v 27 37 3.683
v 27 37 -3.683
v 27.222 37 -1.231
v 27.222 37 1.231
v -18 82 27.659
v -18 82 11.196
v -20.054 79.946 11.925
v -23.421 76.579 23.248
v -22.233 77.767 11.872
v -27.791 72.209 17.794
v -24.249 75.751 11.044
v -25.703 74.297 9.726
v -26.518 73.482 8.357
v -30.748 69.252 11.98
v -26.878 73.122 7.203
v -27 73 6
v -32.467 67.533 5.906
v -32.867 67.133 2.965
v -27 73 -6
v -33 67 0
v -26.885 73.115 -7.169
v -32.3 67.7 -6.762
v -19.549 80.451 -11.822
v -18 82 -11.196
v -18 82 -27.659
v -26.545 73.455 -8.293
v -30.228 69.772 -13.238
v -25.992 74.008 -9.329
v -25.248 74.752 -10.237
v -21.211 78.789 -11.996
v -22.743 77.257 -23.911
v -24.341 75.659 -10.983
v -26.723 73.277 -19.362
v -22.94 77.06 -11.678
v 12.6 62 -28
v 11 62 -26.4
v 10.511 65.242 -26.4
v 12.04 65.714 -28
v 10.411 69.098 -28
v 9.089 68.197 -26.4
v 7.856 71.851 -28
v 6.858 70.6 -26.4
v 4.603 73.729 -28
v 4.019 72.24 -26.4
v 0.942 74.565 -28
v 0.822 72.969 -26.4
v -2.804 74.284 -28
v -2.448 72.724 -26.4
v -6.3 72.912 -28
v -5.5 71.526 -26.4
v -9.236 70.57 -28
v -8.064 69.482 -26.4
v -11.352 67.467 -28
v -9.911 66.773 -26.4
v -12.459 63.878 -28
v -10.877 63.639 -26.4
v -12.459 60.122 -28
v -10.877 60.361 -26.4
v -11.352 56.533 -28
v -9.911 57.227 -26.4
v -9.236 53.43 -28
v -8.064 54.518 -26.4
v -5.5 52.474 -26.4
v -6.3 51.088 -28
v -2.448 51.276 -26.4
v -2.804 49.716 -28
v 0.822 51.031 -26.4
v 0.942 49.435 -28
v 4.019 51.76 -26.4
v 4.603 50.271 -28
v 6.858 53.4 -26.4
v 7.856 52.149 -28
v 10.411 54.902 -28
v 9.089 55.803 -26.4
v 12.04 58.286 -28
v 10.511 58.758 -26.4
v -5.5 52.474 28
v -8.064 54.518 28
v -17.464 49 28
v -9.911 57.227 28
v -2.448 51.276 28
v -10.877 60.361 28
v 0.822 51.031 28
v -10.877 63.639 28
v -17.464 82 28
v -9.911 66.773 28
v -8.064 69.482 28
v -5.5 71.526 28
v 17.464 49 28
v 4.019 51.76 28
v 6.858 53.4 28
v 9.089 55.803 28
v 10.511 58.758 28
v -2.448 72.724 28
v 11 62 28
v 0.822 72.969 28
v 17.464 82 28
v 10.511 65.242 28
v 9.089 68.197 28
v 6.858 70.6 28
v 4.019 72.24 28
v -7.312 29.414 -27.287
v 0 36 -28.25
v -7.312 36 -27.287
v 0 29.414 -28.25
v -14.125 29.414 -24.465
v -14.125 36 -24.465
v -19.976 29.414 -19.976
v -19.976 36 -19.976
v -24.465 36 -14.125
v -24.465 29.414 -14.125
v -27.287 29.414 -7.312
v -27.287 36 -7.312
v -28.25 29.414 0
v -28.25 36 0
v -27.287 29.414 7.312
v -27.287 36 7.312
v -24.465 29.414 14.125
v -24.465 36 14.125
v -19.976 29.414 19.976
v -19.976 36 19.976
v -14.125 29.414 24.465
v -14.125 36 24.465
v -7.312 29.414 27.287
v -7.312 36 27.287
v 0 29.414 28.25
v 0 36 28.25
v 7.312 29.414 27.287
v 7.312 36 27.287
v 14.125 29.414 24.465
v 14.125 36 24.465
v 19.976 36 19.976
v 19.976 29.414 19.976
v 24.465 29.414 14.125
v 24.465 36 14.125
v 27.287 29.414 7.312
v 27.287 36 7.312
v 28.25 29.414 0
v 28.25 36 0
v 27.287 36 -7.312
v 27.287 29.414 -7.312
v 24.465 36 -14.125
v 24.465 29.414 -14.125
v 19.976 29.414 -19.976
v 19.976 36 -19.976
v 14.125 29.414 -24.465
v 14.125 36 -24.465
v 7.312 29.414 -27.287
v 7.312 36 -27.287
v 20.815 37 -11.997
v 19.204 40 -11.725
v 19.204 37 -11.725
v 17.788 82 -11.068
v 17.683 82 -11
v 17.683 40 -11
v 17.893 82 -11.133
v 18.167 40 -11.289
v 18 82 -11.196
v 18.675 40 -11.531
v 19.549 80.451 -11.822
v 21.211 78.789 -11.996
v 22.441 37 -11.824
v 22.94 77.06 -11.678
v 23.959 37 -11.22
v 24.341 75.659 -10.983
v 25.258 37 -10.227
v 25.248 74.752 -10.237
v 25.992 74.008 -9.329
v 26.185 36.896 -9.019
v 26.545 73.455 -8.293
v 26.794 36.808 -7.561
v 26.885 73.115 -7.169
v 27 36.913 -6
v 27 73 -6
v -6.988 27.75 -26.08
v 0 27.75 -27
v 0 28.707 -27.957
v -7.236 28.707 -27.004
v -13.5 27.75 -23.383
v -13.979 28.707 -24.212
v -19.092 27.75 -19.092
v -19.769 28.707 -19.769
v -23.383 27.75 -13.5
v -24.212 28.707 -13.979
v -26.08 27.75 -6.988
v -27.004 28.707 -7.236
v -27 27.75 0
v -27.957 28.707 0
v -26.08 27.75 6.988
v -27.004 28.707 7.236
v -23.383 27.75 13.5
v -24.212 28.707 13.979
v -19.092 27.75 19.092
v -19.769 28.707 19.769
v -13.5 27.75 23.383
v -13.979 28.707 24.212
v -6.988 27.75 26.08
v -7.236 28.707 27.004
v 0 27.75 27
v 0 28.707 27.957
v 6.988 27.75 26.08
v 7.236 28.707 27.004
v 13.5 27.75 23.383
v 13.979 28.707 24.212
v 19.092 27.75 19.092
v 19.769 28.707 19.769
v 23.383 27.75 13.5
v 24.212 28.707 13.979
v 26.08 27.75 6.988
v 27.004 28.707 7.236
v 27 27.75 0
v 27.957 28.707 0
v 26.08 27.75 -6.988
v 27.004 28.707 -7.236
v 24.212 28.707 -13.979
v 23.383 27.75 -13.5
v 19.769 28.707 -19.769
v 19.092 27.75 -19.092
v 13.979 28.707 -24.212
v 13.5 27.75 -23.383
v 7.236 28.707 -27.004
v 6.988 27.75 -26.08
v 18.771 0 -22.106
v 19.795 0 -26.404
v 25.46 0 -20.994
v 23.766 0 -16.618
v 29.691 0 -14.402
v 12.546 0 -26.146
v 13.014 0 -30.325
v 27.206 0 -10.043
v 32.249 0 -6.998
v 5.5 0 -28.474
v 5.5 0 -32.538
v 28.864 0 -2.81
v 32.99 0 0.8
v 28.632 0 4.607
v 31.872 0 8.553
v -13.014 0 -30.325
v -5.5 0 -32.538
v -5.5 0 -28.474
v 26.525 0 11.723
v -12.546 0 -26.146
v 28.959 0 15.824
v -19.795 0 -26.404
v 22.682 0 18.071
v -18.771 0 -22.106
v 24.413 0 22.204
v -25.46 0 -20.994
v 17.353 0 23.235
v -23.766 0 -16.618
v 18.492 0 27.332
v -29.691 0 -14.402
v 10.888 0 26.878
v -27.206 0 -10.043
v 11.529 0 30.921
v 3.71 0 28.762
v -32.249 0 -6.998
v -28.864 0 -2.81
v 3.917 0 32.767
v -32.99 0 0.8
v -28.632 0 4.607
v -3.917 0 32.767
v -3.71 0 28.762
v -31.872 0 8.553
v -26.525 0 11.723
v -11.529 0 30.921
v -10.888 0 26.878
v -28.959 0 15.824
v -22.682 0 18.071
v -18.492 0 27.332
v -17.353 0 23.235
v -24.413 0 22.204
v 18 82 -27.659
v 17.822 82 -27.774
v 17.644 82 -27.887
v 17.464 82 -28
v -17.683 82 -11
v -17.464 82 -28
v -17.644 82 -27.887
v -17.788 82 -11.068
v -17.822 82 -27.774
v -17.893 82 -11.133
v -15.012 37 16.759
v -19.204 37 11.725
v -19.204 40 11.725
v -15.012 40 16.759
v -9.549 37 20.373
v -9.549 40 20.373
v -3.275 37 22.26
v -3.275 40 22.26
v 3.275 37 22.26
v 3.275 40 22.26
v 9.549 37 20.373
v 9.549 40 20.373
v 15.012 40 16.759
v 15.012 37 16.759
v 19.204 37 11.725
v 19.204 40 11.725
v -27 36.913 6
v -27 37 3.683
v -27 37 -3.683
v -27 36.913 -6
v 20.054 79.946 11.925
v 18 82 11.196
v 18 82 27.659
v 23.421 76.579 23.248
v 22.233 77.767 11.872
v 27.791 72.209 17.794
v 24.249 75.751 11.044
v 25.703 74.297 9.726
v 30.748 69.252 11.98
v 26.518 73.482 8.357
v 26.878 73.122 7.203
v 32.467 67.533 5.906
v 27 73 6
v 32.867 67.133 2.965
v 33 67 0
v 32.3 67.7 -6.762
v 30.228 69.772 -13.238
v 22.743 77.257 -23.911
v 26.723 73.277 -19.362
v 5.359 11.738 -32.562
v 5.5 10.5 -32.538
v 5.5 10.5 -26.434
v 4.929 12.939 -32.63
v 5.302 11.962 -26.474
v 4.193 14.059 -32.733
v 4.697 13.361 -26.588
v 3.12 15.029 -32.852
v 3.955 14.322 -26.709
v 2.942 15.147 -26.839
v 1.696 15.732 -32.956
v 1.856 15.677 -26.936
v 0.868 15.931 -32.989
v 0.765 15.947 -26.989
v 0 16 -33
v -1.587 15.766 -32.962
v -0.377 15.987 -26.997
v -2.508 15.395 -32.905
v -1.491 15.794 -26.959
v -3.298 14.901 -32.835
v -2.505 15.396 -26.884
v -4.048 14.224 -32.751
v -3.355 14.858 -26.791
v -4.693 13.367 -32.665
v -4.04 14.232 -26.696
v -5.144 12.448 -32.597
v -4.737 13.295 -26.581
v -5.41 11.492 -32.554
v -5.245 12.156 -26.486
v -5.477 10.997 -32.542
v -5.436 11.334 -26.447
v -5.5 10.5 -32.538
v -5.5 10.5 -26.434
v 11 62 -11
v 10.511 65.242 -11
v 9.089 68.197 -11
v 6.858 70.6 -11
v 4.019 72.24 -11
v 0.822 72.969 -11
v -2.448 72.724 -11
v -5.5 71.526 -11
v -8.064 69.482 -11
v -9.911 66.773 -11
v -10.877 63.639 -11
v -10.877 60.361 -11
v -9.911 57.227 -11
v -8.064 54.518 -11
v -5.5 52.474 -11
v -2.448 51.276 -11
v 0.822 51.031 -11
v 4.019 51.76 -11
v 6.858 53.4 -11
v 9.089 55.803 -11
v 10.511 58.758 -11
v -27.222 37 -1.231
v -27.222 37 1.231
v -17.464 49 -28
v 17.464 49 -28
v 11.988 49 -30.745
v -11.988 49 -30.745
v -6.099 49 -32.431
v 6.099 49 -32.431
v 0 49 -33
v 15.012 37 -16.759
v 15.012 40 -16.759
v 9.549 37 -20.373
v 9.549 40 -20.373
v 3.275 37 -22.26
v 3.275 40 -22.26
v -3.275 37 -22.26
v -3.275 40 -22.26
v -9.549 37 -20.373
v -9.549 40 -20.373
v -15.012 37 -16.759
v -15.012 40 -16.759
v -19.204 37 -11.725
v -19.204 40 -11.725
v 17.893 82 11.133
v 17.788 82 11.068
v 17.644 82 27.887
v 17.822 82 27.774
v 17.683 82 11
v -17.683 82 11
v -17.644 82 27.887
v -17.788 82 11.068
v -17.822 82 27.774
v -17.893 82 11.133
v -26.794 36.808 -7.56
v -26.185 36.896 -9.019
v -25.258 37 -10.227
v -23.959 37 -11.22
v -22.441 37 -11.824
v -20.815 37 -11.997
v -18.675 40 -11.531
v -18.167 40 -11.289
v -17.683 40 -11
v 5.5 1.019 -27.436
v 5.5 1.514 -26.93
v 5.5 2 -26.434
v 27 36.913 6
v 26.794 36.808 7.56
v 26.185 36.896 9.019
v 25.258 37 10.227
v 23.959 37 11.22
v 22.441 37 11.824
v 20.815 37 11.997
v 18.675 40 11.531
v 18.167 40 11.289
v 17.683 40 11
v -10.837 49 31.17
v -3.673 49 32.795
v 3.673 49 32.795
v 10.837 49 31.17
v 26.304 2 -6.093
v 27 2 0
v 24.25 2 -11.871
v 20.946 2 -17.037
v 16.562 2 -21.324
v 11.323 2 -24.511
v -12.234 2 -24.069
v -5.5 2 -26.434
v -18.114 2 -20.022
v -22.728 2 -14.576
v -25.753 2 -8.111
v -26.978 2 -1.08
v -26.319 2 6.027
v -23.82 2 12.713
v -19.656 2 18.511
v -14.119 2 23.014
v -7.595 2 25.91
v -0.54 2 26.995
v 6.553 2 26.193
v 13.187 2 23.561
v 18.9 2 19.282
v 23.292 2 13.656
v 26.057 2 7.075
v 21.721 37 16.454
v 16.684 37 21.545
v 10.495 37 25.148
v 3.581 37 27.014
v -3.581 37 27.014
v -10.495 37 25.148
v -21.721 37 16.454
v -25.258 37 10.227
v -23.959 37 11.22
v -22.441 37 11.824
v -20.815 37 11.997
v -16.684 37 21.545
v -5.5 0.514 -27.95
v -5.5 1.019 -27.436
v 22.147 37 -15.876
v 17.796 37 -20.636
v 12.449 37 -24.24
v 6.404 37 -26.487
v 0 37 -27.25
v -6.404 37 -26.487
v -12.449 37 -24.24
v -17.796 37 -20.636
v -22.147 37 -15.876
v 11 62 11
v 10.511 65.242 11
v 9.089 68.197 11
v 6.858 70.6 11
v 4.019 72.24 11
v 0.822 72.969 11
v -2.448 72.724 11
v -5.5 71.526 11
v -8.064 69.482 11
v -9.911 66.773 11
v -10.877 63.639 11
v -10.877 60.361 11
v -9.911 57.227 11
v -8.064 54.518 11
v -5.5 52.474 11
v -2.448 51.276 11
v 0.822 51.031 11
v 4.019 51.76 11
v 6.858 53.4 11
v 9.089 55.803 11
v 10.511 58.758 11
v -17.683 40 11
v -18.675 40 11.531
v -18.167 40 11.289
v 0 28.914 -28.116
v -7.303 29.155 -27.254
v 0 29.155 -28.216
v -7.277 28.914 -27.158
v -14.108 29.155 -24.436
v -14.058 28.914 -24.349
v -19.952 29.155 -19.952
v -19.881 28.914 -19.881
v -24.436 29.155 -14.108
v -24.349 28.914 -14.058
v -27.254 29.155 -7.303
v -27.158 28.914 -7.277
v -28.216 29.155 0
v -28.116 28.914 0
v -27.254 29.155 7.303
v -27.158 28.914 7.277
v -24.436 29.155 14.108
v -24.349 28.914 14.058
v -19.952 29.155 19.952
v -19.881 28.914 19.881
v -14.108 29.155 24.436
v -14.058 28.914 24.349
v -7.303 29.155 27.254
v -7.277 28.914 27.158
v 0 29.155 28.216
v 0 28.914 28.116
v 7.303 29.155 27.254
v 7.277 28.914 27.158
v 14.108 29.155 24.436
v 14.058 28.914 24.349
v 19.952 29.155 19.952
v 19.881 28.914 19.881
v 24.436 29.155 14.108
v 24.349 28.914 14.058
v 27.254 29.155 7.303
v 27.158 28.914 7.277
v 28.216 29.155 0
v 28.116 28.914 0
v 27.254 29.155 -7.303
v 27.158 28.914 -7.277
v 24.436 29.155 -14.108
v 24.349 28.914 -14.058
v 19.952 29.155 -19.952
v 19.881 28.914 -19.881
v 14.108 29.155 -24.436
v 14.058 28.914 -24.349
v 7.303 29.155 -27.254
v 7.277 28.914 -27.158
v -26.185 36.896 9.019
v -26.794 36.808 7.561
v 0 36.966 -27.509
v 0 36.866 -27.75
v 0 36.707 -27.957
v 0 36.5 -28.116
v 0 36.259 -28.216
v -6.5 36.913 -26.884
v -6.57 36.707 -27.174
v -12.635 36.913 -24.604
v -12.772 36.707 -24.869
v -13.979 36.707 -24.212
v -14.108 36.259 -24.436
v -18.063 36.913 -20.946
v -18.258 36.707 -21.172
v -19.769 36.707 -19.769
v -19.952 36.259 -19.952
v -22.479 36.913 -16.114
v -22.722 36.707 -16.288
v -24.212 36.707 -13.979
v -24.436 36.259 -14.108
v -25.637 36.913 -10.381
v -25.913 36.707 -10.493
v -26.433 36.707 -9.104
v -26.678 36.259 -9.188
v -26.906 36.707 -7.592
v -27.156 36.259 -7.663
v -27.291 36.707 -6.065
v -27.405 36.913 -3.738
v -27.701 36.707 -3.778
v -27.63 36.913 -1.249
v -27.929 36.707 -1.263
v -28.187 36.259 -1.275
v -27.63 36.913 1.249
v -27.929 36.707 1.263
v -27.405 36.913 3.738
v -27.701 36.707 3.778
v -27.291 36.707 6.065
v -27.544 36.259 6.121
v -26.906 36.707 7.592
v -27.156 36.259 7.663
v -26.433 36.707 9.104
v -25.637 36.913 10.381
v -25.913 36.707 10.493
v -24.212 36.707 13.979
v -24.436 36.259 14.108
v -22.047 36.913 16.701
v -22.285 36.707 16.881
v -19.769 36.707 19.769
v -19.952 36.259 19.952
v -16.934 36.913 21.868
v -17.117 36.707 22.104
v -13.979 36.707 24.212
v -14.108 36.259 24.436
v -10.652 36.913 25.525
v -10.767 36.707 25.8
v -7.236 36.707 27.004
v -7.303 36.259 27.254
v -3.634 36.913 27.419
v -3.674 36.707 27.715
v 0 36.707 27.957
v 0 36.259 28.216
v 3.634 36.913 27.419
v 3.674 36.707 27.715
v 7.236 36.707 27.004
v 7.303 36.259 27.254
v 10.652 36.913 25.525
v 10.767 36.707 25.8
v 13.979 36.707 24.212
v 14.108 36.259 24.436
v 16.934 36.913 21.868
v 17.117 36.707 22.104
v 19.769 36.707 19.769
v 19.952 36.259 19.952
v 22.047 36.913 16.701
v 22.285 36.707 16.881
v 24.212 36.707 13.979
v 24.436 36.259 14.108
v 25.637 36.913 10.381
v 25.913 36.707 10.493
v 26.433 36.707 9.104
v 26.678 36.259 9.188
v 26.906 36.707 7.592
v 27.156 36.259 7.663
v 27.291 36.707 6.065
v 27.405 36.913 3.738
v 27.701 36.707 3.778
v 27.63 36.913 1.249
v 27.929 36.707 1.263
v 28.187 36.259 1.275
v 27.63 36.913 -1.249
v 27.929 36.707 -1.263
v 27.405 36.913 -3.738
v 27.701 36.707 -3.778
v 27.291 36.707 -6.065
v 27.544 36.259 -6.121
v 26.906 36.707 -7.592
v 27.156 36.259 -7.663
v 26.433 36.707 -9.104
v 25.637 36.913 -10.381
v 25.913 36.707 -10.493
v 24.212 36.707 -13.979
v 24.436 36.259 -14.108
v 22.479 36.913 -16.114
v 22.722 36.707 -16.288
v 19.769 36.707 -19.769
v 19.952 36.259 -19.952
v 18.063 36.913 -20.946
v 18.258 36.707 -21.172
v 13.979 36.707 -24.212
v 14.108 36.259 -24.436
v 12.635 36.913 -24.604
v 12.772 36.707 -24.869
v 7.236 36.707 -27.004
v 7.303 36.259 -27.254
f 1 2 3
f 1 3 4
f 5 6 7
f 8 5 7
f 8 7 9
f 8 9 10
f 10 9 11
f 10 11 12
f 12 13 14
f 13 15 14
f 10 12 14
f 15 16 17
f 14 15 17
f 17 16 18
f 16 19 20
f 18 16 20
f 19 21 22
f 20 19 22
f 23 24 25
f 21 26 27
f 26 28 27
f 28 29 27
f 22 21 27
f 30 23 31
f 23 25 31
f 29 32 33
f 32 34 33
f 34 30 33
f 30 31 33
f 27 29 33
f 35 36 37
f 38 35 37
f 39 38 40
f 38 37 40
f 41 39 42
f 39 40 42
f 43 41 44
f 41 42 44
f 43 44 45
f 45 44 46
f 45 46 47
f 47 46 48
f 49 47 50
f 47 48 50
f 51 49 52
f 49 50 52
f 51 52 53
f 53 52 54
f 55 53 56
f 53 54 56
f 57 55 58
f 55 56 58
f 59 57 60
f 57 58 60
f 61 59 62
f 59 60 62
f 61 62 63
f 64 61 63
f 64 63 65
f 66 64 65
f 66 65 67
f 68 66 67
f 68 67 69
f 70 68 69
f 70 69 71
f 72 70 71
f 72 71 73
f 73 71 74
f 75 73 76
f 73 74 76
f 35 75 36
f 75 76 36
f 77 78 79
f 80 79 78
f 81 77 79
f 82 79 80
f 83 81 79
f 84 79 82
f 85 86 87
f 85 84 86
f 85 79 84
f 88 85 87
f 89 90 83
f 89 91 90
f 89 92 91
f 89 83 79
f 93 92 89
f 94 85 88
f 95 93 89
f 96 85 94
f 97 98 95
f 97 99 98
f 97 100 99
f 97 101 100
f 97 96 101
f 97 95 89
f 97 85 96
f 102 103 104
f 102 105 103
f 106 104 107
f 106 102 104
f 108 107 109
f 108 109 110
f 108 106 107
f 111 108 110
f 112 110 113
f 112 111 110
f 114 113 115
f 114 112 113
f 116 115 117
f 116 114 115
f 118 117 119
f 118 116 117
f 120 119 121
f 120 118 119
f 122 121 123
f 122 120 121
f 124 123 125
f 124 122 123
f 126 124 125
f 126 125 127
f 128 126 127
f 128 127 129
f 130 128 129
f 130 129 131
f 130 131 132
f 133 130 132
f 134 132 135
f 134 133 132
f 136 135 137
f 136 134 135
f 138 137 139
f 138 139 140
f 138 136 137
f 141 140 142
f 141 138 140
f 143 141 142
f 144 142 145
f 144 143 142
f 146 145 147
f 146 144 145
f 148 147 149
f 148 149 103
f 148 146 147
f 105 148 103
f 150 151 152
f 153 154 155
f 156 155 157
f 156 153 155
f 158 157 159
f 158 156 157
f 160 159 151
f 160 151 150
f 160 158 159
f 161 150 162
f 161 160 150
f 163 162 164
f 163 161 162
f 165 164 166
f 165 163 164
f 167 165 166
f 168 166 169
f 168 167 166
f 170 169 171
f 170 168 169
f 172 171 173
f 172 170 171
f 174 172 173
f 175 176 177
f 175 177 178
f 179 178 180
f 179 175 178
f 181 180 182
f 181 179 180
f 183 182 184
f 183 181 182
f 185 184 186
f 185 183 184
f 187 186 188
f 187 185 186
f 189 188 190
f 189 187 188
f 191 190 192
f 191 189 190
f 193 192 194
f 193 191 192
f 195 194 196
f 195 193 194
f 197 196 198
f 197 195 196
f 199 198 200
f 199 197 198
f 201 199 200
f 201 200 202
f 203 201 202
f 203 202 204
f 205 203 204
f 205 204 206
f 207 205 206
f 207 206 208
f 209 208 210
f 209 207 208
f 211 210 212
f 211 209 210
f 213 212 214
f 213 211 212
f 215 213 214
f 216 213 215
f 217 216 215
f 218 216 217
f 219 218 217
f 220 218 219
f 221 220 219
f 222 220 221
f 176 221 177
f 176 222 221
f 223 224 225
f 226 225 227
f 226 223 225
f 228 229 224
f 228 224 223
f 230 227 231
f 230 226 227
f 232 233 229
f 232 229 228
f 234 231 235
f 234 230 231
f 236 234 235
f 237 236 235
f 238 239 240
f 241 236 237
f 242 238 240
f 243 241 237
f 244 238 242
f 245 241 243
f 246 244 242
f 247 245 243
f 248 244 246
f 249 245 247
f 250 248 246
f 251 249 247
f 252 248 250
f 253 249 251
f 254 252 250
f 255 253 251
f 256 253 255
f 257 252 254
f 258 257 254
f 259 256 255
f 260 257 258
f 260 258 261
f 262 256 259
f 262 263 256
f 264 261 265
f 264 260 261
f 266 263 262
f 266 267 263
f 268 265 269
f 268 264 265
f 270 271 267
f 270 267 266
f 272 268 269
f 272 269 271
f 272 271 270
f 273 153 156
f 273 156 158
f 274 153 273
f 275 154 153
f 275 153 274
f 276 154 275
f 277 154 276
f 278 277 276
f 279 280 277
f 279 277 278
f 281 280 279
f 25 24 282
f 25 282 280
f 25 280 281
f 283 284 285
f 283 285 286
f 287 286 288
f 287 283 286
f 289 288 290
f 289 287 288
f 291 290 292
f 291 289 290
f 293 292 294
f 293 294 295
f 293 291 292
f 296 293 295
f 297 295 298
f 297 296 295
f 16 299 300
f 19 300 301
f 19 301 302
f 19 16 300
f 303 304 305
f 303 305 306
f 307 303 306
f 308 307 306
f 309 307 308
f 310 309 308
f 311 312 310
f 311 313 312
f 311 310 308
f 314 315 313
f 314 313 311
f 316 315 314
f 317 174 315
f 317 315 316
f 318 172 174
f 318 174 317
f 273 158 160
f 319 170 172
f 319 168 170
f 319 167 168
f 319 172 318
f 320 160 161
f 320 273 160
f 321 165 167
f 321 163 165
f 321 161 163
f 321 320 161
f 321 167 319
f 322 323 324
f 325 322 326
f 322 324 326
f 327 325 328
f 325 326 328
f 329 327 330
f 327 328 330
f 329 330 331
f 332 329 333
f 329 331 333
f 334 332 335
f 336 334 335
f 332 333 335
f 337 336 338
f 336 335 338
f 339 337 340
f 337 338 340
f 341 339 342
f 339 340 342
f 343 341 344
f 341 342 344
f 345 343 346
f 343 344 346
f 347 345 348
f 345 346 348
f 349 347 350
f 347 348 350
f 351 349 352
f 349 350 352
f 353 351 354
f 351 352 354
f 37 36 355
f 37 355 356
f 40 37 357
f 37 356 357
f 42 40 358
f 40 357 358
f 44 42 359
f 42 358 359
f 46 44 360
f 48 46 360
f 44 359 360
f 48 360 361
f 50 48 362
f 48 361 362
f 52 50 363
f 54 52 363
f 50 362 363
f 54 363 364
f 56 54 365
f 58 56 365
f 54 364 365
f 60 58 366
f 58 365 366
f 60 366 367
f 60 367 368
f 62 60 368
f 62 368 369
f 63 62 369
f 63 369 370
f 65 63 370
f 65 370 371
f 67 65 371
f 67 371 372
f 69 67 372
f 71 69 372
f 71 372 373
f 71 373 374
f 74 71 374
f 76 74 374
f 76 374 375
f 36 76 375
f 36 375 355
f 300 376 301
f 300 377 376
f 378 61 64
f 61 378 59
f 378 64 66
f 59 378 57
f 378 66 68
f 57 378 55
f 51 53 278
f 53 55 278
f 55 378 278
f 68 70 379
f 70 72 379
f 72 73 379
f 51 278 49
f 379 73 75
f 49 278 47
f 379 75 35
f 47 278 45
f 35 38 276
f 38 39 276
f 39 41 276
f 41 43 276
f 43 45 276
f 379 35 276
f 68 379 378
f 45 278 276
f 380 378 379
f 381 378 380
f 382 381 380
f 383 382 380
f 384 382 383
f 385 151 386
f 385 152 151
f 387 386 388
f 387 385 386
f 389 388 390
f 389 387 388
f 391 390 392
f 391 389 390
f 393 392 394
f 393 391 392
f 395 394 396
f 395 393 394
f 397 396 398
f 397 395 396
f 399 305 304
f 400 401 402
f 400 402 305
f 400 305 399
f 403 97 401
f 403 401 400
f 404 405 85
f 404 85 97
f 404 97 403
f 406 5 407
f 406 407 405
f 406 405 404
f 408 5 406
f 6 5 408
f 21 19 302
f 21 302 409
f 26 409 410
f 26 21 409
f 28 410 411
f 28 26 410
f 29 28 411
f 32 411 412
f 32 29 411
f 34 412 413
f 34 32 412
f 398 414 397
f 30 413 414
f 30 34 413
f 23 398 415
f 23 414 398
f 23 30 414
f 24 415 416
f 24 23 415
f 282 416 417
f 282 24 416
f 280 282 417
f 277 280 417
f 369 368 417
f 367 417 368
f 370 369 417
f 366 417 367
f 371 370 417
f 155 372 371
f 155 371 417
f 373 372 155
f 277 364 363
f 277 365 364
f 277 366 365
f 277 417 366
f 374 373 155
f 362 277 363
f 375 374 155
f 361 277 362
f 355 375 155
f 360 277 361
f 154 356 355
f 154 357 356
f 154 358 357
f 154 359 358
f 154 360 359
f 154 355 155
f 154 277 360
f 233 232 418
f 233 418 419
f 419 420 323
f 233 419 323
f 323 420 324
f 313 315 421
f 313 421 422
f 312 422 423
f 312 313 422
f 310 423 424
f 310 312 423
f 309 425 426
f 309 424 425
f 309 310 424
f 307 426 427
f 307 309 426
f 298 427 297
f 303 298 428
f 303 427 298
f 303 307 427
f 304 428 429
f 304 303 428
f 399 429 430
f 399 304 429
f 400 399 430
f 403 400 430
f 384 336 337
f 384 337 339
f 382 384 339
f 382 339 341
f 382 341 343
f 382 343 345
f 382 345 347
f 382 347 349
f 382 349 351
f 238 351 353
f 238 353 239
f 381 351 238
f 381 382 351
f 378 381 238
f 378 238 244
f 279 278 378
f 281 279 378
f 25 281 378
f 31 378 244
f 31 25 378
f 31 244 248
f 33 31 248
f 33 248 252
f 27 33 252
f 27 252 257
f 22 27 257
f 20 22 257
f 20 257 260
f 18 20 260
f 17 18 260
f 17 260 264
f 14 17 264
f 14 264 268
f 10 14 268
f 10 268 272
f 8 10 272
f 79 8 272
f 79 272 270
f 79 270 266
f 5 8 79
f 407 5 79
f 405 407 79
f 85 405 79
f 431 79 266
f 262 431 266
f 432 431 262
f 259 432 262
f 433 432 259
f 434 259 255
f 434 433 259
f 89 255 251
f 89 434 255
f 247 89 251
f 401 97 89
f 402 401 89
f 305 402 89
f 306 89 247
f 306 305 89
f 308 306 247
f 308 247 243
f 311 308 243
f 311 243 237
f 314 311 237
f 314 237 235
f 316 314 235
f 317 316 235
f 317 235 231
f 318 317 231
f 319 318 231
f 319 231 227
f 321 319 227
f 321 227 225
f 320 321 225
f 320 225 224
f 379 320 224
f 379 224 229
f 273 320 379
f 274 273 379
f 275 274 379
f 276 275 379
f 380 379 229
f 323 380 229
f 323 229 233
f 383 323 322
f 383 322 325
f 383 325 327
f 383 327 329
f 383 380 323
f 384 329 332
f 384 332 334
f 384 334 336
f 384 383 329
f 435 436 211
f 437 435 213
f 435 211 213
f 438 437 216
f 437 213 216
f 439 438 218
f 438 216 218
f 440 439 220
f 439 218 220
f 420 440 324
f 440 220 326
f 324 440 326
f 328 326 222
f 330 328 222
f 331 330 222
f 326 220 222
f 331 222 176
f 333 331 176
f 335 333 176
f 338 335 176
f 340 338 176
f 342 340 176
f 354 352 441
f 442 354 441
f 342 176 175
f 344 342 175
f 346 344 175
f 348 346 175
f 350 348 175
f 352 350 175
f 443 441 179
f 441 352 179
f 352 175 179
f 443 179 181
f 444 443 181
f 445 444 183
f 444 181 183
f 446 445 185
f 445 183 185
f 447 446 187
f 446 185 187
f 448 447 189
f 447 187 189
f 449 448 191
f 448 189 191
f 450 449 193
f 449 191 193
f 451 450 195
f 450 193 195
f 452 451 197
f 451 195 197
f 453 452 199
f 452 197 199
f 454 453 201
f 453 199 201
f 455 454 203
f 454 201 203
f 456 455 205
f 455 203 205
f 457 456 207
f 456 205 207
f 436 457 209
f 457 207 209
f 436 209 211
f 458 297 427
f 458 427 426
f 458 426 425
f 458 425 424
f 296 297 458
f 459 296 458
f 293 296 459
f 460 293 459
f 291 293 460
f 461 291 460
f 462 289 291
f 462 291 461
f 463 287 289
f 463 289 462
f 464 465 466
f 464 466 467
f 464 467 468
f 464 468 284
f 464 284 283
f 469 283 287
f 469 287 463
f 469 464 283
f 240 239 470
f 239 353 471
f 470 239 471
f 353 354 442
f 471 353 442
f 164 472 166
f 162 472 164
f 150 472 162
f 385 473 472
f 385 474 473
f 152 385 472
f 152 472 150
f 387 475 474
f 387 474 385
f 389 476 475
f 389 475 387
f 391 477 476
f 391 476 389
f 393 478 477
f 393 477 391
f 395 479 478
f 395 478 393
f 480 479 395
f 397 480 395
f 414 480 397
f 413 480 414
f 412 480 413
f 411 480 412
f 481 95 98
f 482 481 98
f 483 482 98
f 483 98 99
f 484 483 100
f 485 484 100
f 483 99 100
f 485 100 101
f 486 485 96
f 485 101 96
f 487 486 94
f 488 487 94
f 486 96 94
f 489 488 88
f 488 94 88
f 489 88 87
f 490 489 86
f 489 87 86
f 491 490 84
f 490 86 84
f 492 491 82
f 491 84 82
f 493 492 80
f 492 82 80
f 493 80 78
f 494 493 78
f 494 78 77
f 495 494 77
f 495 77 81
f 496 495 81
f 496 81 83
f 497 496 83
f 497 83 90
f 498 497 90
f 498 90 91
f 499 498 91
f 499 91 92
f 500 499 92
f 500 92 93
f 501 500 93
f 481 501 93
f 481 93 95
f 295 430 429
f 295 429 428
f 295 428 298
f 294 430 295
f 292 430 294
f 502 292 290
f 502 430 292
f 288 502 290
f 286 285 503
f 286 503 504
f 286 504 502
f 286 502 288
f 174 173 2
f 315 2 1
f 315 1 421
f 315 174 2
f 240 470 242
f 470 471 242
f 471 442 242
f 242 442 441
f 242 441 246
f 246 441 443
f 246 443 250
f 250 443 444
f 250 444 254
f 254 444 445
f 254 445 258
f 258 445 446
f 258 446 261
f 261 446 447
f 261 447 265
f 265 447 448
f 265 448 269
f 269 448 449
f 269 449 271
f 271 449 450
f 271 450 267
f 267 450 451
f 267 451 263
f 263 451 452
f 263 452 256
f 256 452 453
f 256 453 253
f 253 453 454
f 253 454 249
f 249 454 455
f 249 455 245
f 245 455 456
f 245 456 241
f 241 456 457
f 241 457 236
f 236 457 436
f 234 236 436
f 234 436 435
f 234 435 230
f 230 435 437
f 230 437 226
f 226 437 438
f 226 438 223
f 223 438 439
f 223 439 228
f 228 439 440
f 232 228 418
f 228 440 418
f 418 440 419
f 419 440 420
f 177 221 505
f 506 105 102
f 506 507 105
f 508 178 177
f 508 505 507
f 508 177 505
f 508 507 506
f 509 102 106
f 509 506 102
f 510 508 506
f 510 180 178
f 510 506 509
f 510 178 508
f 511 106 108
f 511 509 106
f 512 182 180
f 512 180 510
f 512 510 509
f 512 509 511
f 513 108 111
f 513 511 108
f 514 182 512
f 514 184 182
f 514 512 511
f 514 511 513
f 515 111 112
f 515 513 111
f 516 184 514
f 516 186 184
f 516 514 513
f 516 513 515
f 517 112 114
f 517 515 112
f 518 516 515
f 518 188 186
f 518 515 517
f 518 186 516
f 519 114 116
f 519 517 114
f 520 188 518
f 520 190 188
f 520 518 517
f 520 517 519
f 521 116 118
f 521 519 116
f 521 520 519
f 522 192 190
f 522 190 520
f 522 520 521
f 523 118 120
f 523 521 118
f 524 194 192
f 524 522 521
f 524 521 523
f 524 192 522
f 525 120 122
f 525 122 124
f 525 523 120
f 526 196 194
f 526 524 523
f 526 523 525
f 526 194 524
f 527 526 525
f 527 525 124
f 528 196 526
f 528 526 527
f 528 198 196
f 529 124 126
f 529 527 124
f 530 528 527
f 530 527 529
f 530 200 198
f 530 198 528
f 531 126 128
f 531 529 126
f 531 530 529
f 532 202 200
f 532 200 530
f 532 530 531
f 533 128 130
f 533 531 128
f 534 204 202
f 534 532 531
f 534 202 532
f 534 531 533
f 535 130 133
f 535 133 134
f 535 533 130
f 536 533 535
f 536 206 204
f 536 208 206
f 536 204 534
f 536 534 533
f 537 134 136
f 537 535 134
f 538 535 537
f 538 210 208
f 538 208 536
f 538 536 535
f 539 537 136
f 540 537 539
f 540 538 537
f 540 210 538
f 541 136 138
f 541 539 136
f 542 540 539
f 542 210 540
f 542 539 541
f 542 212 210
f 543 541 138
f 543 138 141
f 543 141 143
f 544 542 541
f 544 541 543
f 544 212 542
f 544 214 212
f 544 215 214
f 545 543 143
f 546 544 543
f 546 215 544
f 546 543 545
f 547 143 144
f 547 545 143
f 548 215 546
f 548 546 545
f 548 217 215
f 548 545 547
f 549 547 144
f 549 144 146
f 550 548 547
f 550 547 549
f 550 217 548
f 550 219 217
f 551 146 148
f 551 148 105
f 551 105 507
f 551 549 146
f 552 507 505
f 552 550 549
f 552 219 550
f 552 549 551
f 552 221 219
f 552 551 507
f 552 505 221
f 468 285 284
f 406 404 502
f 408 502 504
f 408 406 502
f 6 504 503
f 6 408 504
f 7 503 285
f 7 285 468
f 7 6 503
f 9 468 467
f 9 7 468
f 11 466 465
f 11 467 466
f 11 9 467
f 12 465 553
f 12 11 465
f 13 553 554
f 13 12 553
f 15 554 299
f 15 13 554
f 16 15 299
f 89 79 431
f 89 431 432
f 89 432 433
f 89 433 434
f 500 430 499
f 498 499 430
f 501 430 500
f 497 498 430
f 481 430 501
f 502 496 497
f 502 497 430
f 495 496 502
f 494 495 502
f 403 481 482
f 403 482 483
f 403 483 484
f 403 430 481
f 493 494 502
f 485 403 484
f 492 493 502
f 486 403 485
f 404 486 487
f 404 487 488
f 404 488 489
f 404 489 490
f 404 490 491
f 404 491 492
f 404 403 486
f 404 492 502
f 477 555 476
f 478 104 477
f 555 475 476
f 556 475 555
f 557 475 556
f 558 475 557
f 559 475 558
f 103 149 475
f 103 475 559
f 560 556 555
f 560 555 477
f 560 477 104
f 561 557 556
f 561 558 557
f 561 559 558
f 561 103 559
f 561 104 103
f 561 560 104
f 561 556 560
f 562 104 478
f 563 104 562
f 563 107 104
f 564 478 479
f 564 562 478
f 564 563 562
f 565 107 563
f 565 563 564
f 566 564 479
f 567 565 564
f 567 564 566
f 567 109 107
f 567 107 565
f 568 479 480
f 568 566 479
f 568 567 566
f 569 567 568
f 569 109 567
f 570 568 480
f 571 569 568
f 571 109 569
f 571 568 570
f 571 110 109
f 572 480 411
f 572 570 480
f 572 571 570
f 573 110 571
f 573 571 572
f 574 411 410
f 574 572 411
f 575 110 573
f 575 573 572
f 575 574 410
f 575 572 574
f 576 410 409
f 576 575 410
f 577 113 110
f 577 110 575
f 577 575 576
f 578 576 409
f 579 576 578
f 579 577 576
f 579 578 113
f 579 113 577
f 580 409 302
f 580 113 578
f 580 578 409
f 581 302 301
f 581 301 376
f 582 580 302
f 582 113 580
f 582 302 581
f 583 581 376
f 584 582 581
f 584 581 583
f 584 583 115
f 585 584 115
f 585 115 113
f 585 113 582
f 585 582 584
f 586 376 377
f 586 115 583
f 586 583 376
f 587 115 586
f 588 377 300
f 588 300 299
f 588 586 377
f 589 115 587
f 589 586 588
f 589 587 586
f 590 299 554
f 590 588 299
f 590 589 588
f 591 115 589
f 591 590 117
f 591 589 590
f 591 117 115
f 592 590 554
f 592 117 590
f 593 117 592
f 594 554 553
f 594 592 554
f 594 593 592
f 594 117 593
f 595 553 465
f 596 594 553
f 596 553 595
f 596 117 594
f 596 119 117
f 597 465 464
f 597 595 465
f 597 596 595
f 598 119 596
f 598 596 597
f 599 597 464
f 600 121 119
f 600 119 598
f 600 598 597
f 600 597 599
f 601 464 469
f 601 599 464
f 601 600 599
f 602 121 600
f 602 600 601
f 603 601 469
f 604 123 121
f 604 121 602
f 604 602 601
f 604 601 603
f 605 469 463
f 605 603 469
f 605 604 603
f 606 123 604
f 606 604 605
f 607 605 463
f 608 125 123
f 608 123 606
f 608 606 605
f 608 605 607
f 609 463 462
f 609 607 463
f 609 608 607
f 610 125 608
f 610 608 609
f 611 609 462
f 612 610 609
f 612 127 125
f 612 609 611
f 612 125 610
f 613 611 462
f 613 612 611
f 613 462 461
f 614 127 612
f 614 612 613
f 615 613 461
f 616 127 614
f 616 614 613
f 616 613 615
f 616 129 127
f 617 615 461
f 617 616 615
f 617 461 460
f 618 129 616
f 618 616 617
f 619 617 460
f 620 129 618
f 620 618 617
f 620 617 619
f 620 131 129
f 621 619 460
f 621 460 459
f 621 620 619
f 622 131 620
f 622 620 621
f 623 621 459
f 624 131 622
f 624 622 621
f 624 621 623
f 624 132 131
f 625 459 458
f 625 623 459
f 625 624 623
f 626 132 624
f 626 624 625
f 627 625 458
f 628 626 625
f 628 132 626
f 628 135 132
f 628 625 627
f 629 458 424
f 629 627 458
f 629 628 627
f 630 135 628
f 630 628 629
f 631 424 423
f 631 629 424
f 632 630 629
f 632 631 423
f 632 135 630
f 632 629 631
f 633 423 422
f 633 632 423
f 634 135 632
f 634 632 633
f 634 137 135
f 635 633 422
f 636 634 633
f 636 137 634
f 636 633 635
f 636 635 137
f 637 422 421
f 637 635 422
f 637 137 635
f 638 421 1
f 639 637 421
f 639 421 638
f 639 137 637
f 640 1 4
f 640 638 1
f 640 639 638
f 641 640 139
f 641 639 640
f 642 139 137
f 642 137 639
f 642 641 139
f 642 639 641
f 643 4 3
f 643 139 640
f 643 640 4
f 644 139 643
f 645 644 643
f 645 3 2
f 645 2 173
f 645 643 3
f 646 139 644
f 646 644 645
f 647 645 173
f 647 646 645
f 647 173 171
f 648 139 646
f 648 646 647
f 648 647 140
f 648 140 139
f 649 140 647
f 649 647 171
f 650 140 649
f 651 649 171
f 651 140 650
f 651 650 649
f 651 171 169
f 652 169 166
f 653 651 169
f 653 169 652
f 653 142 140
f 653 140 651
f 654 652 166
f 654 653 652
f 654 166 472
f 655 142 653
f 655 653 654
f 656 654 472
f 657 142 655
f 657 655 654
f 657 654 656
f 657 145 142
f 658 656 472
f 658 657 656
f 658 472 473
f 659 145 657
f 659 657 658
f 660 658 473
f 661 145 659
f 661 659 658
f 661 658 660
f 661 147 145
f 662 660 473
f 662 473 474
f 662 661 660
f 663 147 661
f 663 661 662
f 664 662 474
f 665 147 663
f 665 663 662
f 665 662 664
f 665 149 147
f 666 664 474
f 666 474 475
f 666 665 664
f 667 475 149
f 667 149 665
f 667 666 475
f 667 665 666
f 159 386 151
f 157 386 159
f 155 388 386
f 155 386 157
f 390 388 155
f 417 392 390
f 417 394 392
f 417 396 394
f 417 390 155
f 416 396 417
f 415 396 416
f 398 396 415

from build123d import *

# Parameters (mm, degrees)
HOLE_WIZARD_M561_D           = 54
HOLE_WIZARD_M561_DEPTH       = 30
HOLE_WIZARD_M561_CSINK_D     = 58
HOLE_WIZARD_M561_CSINK_ANGLE = 90
CUT_EXTRUDE_START            = 28
SKETCH_4_W                   = 66
SKETCH_4_H                   = 33
CUT_EXTRUDE_1_DEPTH          = 67.350410704
CUT_EXTRUDE_START_2          = -28
SKETCH_4_2_W                 = 66
SKETCH_4_2_H                 = 33
CUT_EXTRUDE_2_DEPTH          = 67.350410704
SKETCH_5_R                   = 11
CUT_EXTRUDE_3_DEPTH          = 108.396461767
CUT_EXTRUDE_5_DEPTH          = 50
CUT_EXTRUDE_6_DEPTH          = 95.350410791
CUT_EXTRUDE_6_DEPTH_BACK     = 95.350410791
CHAMFER_1_SIZE               = 1.6
CUT_EXTRUDE_8_DEPTH          = 95.350410791


with BuildPart() as part:
    # Эскиз1 → Повернуть1 (revolve)
    with BuildSketch(Plane.XY):
        with BuildLine():
            Line((-33, 0), (-33, 82))
            Line((-33, 82), (0, 82))
            Line((0, 82), (0, 40))
            Line((0, 40), (-22.5, 40))
            Line((-22.5, 40), (-22.5, 37))
            Line((-22.5, 37), (-27.25, 37))
            ThreePointArc((-27.25, 37), (-27.957106781, 36.707106781), (-28.25, 36))
            Line((-28.25, 36), (-28.25, 29.414213562))
            ThreePointArc((-28.25, 29.414213562), (-28.173879533, 29.03153013), (-27.957106781, 28.707106781))
            Line((-27.957106781, 28.707106781), (0, 0.75))
            Line((0, 0.75), (0, 0))
            Line((0, 0), (-33, 0))
        make_face()
    revolve(axis=Axis((0, 0, 0), (0, 1, 0)))

    # Отверстие обработанное метчиком M561
    with Locations(Plane(origin=(0, 0, 0), x_dir=(-1, 0, 0), z_dir=(0, -1, 0))):
        with Locations((0, 0)):
            CounterSinkHole(HOLE_WIZARD_M561_D / 2, HOLE_WIZARD_M561_CSINK_D / 2, depth=HOLE_WIZARD_M561_DEPTH, counter_sink_angle=HOLE_WIZARD_M561_CSINK_ANGLE)

    # Эскиз4 → Вырез-Вытянуть1 (cut, through all)
    with BuildSketch(Plane.XY.offset(CUT_EXTRUDE_START)):
        with Locations((0, 65.5)):
            Rectangle(SKETCH_4_W, SKETCH_4_H)
    extrude(amount=CUT_EXTRUDE_1_DEPTH, mode=Mode.SUBTRACT)

    # Эскиз4<2> → Вырез-Вытянуть2 (cut, through all)
    with BuildSketch(Plane.XY.offset(CUT_EXTRUDE_START_2)):
        with Locations((0, 65.5)):
            Rectangle(SKETCH_4_2_W, SKETCH_4_2_H)
    extrude(amount=-CUT_EXTRUDE_2_DEPTH, mode=Mode.SUBTRACT)

    # Эскиз5 → Вырез-Вытянуть3 (cut, through all)
    with BuildSketch(Plane.XY.offset(28)):
        with Locations((0, 62)):
            Circle(SKETCH_5_R)
    extrude(amount=-CUT_EXTRUDE_3_DEPTH, mode=Mode.SUBTRACT)

    # Эскиз6 → Вырез-Вытянуть5 (cut)
    with BuildSketch(Plane(origin=(0, 82, 0), x_dir=(1, 0, 0), z_dir=(0, 1, 0))):
        with BuildLine():
            Line((17.68337521, -11), (-17.68337521, -11))
            ThreePointArc((-17.68337521, -11), (-23.837274331, -11.286764074), (-27, -6))
            Line((-27, -6), (-27, 6))
            ThreePointArc((-27, 6), (-23.837274331, 11.286764074), (-17.68337521, 11))
            Line((-17.68337521, 11), (17.68337521, 11))
            ThreePointArc((17.68337521, 11), (23.837274331, 11.286764074), (27, 6))
            Line((27, 6), (27, -6))
            ThreePointArc((27, -6), (23.837274331, -11.286764074), (17.68337521, -11))
        make_face()
    extrude(amount=-CUT_EXTRUDE_5_DEPTH, mode=Mode.SUBTRACT)

    # Эскиз7 → Вырез-Вытянуть6 (cut, two sides: drawn at the far end of the back side and taken through both)
    with BuildSketch(Plane.XY.offset(-CUT_EXTRUDE_6_DEPTH_BACK)):
        Polygon((-33, 82), (-18, 82), (-33, 67), align=None)
        Polygon((33, 67), (33, 82), (18, 82), align=None)
    extrude(amount=CUT_EXTRUDE_6_DEPTH + CUT_EXTRUDE_6_DEPTH_BACK, mode=Mode.SUBTRACT)

    # Фаска1
    chamfer_1_edges = [part.edges().sort_by_distance(p)[0] for p in [
        (-11, 62, -28),
    ]]
    chamfer(chamfer_1_edges, length=CHAMFER_1_SIZE)

    # Эскиз10 → Вырез-Вытянуть8 (cut, through all)
    with BuildSketch(Plane.XY):
        with BuildLine():
            Line((-5.5, 0), (5.5, 0))
            Line((5.5, 0), (5.5, 10.5))
            ThreePointArc((5.5, 10.5), (0, 16), (-5.5, 10.5))
            Line((-5.5, 10.5), (-5.5, 0))
        make_face()
    extrude(amount=-CUT_EXTRUDE_8_DEPTH, mode=Mode.SUBTRACT)


solid = part.part
